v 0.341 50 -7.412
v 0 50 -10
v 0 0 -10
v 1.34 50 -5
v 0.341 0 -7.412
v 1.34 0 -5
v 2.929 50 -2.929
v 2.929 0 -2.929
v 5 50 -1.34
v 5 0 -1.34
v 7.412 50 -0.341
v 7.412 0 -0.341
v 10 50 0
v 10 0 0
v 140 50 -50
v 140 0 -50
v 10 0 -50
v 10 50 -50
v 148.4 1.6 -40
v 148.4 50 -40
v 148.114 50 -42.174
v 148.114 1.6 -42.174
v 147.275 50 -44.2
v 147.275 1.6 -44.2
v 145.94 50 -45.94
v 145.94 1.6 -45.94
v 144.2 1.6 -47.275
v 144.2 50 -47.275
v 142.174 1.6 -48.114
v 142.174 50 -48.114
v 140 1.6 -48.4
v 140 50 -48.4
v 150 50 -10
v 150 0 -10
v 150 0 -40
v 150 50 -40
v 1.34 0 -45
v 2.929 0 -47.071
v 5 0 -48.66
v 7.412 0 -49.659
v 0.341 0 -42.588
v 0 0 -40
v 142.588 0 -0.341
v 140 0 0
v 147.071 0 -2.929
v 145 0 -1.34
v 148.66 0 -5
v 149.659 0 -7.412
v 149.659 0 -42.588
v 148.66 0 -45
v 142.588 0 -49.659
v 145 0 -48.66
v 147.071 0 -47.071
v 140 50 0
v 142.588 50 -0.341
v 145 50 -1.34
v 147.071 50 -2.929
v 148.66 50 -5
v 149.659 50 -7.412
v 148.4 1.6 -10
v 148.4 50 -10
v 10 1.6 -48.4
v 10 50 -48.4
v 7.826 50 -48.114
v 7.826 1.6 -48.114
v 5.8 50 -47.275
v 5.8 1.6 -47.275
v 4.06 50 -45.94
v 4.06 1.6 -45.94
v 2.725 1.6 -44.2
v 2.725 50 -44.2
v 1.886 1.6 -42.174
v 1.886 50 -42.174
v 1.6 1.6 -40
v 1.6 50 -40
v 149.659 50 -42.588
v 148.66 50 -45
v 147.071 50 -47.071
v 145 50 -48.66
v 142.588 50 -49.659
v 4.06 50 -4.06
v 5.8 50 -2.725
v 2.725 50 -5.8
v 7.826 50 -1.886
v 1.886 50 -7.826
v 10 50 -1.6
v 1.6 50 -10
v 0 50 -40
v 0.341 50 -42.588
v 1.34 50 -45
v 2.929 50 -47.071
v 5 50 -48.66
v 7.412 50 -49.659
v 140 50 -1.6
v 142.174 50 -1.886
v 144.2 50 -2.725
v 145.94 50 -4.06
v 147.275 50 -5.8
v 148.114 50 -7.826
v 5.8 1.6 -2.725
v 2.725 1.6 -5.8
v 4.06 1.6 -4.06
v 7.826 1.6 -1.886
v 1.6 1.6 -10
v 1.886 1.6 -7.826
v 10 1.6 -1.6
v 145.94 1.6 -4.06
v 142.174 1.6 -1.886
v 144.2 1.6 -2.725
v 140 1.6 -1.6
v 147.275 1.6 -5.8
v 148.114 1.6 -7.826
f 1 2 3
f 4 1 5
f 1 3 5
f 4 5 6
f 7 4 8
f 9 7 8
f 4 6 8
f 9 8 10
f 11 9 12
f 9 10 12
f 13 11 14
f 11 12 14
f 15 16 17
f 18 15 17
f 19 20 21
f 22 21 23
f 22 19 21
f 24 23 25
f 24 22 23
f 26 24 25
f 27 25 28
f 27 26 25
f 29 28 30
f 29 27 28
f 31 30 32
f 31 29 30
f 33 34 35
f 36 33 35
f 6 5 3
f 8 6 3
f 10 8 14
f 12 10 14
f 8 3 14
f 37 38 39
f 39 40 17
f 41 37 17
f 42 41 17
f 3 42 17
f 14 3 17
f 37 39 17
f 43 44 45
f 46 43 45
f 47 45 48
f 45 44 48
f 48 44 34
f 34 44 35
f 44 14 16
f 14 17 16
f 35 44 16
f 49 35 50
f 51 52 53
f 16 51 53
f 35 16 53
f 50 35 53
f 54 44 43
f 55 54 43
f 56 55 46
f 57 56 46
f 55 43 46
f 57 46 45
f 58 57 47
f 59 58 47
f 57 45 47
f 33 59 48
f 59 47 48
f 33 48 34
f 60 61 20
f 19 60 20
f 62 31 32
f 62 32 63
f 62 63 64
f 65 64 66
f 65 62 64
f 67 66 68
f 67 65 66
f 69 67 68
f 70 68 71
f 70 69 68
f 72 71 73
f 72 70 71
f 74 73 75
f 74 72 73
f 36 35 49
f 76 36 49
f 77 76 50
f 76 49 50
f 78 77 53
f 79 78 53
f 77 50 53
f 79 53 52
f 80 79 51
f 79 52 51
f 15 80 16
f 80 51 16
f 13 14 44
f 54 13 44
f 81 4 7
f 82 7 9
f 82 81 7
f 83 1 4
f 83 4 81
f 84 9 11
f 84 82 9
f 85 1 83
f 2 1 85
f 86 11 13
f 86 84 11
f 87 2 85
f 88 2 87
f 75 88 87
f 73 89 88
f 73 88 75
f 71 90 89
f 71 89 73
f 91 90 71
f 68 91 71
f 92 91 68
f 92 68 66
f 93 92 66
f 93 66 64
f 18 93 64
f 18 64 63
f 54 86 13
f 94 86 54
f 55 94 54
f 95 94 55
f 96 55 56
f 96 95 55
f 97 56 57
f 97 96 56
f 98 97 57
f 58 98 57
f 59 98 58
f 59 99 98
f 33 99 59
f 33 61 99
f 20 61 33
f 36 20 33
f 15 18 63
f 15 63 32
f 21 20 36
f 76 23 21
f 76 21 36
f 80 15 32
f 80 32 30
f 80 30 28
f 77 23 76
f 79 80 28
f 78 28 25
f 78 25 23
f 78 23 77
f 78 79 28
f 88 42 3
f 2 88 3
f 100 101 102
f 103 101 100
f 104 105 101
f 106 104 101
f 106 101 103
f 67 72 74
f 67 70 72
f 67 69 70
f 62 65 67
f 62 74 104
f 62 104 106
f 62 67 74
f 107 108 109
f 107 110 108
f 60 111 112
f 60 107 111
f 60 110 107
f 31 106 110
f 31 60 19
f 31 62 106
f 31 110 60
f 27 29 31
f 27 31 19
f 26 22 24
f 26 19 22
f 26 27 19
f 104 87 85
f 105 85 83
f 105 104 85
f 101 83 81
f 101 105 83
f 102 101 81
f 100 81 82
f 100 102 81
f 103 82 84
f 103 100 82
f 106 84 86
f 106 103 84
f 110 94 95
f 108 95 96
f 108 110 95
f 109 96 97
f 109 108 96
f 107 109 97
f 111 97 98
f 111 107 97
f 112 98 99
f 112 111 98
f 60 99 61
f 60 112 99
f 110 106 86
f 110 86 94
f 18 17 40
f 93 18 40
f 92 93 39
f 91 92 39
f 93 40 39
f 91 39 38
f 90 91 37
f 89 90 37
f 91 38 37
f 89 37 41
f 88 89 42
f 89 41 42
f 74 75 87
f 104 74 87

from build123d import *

# Parameters (mm, degrees)
EXTRUDE_1_DEPTH = 50
SHELL_1_T       = -1.6


with BuildPart() as part:
    # 草图1 → 凸台-拉伸1 (new body)
    with BuildSketch(Plane(origin=(0, 0, 0), x_dir=(1, 0, 0), z_dir=(0, 1, 0))):
        with BuildLine():
            Line((10, 0), (140, 0))
            ThreePointArc((140, 0), (147.071067812, 2.928932188), (150, 10))
            Line((150, 10), (150, 40))
            ThreePointArc((150, 40), (147.071067812, 47.071067812), (140, 50))
            Line((140, 50), (10, 50))
            ThreePointArc((10, 50), (2.928932188, 47.071067812), (0, 40))
            Line((0, 40), (0, 10))
            ThreePointArc((0, 10), (2.928932188, 2.928932188), (10, 0))
        make_face()
    extrude(amount=EXTRUDE_1_DEPTH)

    # 抽壳1
    shell_1_openings = [part.faces().sort_by_distance(p)[0] for p in [
        (75, 50, -25),
    ]]
    offset(amount=SHELL_1_T, openings=shell_1_openings, kind=Kind.INTERSECTION)


solid = part.part
